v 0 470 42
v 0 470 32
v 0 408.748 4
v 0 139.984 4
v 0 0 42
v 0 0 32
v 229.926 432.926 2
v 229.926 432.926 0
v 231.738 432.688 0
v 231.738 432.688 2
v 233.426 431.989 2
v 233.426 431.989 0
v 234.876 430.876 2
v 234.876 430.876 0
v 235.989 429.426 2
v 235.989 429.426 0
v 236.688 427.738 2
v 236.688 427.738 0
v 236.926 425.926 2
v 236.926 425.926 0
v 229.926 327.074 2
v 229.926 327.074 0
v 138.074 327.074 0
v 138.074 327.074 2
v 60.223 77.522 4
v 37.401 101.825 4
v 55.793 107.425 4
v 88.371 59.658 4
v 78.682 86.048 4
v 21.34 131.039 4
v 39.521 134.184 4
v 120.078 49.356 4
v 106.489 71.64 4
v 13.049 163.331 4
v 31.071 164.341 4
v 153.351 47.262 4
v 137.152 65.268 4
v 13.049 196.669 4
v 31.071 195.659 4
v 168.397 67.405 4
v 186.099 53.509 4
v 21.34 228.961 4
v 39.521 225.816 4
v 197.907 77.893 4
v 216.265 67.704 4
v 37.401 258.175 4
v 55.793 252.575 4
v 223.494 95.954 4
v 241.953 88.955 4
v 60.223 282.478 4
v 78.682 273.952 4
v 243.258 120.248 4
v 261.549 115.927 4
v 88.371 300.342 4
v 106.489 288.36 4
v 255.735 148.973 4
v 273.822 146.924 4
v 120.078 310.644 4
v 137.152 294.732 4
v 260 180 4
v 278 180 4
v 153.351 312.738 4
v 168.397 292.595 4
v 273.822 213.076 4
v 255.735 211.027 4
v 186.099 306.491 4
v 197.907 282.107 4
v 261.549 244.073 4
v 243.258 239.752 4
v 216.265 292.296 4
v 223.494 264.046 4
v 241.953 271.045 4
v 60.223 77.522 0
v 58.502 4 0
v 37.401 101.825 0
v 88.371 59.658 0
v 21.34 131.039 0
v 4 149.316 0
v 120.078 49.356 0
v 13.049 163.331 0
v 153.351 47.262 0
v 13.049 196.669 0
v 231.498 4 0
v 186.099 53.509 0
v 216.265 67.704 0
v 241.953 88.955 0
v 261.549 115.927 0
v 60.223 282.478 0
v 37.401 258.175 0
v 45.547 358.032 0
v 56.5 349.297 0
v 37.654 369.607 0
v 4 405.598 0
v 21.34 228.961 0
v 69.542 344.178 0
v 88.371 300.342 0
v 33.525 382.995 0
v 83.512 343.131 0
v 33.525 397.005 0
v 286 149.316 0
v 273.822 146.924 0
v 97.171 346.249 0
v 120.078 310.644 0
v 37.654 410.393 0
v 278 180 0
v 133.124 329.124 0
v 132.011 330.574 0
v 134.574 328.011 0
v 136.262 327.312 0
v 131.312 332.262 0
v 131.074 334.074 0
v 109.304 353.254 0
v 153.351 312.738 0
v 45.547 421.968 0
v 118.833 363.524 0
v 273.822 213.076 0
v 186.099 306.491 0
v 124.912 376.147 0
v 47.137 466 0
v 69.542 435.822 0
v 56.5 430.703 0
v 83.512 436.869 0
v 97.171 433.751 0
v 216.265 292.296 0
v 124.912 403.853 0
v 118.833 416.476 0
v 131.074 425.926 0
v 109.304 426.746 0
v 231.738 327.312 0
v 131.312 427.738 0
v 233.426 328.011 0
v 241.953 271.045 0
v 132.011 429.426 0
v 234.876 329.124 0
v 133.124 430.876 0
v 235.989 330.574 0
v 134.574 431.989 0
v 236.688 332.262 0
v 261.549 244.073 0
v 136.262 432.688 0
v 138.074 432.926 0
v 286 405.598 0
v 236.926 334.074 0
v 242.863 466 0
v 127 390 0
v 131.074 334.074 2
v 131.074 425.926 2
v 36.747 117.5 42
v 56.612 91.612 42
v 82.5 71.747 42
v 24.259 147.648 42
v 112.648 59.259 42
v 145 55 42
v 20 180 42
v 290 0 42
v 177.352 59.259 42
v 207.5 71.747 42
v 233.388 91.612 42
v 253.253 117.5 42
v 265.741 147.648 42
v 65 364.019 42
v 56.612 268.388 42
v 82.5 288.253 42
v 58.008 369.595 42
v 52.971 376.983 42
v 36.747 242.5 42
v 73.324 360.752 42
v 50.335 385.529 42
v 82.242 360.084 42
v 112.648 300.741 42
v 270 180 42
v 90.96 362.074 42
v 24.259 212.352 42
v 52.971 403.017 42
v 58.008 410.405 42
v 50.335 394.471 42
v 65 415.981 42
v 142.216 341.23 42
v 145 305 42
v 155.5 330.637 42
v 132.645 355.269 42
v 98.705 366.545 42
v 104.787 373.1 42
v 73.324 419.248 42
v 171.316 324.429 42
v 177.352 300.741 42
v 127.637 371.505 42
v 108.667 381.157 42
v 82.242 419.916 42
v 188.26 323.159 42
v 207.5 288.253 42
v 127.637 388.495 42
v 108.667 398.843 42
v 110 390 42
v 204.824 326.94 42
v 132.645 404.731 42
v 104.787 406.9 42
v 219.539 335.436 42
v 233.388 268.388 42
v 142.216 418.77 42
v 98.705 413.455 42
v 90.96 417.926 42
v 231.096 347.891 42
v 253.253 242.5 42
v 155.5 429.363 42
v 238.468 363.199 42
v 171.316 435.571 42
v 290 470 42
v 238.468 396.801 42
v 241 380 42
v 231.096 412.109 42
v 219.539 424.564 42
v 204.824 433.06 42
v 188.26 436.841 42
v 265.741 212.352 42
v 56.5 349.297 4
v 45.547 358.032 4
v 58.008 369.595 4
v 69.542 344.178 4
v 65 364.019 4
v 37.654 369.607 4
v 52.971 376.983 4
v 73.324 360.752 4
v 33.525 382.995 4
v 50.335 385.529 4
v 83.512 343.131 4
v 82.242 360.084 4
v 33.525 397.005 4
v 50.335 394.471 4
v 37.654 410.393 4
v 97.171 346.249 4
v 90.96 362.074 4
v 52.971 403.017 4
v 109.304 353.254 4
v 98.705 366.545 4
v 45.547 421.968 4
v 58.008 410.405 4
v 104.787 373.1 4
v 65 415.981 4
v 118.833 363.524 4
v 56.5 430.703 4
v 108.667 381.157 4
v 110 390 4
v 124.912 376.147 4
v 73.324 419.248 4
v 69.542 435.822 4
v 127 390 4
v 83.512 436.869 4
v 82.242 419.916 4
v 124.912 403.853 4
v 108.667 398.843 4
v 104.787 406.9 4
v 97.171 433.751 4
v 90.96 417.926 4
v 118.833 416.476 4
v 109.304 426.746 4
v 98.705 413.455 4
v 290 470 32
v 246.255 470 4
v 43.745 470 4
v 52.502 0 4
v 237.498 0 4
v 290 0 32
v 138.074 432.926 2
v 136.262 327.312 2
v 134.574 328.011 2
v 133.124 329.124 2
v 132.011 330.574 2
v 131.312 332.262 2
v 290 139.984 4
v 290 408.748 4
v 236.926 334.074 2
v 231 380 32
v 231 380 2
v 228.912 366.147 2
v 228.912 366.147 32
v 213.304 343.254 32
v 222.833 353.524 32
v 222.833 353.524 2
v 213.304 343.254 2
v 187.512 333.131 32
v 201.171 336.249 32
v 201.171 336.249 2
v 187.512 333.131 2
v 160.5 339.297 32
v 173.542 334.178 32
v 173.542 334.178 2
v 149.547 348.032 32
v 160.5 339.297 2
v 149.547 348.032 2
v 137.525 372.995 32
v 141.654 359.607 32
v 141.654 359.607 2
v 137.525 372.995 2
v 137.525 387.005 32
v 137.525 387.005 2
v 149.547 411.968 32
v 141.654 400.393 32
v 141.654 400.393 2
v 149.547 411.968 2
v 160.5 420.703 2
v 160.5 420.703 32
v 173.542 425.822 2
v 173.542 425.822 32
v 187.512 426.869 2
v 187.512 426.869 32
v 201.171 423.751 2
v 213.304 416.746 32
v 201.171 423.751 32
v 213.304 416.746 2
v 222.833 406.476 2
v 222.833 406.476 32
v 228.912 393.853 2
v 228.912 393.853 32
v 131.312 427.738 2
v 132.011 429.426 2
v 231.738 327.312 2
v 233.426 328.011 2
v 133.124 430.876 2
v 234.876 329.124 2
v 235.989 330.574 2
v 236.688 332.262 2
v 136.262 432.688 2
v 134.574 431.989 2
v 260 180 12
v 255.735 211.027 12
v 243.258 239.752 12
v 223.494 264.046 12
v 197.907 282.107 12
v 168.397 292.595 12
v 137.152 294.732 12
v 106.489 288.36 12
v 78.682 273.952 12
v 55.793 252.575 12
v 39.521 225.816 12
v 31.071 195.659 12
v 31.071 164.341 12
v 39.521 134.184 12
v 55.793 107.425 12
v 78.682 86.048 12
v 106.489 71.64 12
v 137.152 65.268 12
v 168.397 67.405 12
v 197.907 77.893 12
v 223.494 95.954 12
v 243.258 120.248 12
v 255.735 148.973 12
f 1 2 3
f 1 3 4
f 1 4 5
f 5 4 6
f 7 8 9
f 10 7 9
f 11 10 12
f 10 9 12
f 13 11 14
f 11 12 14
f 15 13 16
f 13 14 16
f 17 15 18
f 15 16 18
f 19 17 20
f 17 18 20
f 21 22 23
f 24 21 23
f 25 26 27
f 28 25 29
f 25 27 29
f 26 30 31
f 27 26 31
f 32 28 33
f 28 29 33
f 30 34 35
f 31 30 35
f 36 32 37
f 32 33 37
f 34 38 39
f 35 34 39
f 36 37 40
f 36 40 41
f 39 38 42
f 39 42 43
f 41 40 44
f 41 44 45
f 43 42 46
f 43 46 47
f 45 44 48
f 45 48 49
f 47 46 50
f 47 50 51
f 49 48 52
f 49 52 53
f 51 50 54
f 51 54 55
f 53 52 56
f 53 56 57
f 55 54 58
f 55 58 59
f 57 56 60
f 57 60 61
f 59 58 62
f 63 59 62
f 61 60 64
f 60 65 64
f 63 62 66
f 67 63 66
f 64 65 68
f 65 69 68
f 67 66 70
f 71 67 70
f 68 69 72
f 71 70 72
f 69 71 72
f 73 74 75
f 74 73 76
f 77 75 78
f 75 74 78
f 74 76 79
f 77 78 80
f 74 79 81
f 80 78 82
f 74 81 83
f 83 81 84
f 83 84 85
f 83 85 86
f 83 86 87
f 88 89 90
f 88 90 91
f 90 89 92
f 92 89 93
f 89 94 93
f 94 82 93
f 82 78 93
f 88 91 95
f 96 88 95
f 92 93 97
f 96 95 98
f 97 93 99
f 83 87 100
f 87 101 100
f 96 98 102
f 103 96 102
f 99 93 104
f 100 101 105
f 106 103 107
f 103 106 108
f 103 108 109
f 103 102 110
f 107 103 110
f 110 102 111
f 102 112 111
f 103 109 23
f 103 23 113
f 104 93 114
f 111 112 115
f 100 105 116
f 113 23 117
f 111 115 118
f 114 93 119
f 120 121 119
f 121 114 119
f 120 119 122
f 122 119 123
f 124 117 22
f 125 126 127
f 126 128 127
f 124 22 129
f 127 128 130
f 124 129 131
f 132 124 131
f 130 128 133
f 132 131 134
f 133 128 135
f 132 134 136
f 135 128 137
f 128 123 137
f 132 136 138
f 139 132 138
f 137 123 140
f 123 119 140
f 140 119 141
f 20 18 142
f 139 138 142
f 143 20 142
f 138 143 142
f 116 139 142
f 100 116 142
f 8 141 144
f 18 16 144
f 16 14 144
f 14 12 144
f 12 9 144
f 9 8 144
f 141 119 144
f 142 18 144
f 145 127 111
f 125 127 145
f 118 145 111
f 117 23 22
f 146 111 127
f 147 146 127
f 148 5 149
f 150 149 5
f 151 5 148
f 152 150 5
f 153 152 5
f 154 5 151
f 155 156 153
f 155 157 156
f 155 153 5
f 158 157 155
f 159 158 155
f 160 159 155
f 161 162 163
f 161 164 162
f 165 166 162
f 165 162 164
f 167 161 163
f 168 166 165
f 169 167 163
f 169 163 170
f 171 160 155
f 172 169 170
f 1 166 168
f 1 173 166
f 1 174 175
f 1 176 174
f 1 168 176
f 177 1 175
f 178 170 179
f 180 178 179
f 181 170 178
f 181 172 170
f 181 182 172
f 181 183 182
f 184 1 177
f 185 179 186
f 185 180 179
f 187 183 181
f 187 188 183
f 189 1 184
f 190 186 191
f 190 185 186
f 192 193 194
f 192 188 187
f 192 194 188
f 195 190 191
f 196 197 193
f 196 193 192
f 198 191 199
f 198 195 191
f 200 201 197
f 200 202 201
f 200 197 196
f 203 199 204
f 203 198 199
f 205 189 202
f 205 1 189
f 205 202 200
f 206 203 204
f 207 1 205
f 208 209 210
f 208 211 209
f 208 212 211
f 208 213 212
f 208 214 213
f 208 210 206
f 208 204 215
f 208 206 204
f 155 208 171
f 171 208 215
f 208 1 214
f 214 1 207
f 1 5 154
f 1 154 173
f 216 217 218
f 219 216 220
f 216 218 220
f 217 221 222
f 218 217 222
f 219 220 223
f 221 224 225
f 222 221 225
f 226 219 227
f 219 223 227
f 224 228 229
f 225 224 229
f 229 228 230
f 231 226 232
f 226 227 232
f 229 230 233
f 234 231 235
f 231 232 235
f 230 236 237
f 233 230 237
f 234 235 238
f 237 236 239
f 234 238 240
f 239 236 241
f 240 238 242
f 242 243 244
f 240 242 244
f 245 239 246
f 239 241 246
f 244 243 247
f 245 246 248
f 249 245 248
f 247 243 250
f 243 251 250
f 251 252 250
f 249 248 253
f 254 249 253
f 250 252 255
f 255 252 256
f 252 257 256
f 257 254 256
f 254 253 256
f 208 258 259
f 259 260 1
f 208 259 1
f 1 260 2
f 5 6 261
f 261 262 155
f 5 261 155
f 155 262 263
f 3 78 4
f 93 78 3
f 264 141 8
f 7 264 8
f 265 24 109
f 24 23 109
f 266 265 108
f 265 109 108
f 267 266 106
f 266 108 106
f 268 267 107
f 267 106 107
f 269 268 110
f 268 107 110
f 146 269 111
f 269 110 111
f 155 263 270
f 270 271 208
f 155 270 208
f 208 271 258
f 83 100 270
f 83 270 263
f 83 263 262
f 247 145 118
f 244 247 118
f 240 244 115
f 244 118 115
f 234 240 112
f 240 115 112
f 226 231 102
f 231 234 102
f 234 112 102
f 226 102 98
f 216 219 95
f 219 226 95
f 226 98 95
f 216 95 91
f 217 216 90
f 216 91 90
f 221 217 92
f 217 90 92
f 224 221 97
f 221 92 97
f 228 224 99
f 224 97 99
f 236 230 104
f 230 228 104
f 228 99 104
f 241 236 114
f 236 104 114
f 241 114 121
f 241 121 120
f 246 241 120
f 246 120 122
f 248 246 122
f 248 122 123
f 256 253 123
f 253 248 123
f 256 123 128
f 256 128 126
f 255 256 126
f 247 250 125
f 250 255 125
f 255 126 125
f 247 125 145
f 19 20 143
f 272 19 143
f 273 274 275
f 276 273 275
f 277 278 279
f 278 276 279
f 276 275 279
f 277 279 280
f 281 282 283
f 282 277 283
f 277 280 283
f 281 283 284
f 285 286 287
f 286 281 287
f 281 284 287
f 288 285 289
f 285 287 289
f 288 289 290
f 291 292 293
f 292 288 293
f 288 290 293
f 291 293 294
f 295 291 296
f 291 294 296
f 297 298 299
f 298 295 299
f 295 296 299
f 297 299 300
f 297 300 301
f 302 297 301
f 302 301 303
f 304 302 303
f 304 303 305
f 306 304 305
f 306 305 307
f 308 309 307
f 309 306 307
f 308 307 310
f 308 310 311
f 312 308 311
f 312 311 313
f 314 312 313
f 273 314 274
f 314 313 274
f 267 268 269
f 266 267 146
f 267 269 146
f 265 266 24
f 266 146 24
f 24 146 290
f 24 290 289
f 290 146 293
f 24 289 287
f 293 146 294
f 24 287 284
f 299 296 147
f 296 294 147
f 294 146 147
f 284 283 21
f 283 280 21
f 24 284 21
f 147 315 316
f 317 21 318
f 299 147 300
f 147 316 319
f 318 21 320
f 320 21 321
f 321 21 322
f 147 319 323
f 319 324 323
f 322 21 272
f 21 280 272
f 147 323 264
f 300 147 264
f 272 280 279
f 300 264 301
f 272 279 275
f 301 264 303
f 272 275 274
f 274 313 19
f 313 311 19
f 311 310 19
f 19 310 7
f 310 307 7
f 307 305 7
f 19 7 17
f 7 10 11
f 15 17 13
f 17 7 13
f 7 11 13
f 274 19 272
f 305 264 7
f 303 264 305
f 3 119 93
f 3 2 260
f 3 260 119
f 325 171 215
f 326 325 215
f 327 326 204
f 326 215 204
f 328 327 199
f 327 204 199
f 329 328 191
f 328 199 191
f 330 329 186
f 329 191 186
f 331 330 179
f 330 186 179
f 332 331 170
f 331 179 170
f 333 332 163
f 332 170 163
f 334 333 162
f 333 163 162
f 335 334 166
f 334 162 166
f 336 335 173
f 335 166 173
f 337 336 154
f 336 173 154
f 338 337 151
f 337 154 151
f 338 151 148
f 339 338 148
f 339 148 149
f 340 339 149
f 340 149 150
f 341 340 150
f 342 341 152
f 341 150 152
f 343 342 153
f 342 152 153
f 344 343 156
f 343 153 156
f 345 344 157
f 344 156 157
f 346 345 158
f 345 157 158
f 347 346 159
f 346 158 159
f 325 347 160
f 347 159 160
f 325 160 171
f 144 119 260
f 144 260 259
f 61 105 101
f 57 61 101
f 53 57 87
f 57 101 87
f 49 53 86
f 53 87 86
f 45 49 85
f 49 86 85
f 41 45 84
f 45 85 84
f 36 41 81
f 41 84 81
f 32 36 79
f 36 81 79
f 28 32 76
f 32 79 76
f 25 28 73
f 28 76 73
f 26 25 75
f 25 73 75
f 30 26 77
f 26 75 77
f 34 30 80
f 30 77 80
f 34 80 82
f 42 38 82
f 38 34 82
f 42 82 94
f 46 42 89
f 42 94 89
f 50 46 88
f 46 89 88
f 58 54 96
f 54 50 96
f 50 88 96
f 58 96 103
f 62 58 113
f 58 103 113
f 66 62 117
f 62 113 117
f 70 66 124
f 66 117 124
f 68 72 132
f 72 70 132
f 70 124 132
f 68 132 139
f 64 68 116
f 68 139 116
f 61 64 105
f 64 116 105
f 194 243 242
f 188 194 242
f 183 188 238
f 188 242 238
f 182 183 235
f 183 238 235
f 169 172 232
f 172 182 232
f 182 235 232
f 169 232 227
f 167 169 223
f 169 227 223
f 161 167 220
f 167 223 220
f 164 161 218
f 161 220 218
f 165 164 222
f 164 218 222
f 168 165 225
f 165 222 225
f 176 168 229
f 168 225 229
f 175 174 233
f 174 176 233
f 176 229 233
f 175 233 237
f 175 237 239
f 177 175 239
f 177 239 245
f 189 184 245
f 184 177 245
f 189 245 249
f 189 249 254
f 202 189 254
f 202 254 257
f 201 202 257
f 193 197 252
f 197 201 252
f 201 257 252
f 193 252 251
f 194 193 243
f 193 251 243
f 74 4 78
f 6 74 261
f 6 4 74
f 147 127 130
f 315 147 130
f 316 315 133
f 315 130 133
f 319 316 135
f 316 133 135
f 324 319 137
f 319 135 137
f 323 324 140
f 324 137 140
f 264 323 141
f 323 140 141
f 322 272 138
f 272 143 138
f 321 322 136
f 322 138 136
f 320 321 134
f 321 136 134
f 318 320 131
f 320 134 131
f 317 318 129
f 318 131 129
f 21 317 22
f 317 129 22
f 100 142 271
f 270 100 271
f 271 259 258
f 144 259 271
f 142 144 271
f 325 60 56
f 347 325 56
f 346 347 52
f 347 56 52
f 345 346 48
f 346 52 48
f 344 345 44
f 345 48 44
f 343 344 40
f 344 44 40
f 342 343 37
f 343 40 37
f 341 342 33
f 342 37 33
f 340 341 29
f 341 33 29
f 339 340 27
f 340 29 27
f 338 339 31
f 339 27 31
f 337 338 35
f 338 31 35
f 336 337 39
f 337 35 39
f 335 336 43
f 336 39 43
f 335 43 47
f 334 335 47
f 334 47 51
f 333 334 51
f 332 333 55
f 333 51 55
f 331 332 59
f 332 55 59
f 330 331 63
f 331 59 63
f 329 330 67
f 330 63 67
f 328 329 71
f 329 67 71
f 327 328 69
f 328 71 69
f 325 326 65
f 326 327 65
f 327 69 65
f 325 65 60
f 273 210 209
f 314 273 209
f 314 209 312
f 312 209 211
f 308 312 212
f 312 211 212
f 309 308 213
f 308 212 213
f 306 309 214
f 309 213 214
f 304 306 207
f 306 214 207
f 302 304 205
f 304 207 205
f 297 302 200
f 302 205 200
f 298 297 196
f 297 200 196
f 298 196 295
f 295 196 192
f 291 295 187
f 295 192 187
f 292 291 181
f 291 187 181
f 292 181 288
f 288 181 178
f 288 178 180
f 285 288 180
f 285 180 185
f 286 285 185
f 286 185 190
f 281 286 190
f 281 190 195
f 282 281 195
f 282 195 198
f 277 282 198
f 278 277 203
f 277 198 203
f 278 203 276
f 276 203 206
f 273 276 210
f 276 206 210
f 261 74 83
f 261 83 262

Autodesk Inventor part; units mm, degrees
sketch "Эскиз1" plane through (0, 0, 0) normal (0, 0, 1) x (1, 0, 0)
  line L0 (0, 0) -> (290, 0)
  line L1 (290, 0) -> (290, 470)
  line L2 (290, 470) -> (0, 470)
  line L3 (0, 470) -> (0, 0)
  line L4 (145, 470) -> (145, 0) construction
  circle A0 centre (145, 180) radius 133
  circle A1 centre (145, 180) radius 115
  circle A2 centre (80, 390) radius 47
  circle A3 centre (80, 390) radius 30
  line L5 (138.0736, 432.9264) -> (229.9264, 432.9264)
  line L6 (236.9264, 425.9264) -> (236.9264, 334.0736)
  line L7 (229.9264, 327.0736) -> (138.0736, 327.0736)
  line L8 (131.0736, 334.0736) -> (131.0736, 425.9264)
  line L9 (131.0736, 432.9264) -> (236.9264, 327.0736) construction
  line L10 (236.9264, 432.9264) -> (131.0736, 327.0736) construction
  circle A4 centre (184, 380) radius 47
  circle A5 centre (184, 380) radius 58 construction
  line L11 (0, 160) -> (60, 0)
  line L12 (290, 160) -> (230, 0)
  line L13 (50, 470) -> (0, 400)
  line L14 (240, 470) -> (290, 400)
  line L15 (290, 320) -> (0, 320) construction
  arc A6 (236.9264, 428.9264) -> (232.9264, 432.9264) centre (232.9264, 428.9264) ccw
  arc A7 (236.9264, 425.9264) -> (229.9264, 432.9264) centre (229.9264, 425.9264) ccw
  arc A8 (138.0736, 432.9264) -> (131.0736, 425.9264) centre (138.0736, 425.9264) ccw
  arc A9 (131.0736, 334.0736) -> (138.0736, 327.0736) centre (138.0736, 334.0736) ccw
  arc A10 (229.9264, 327.0736) -> (236.9264, 334.0736) centre (229.9264, 334.0736) ccw
  line L16 (0, 320) -> (290, 320)
  dimension "d0" = 290
  dimension "d1" = 470
  dimension "d3" = 266
  dimension "d4" = 230
  dimension "d5" = 94
  dimension "d6" = 60
  dimension "d9" = 94
  dimension "d11" = 380
  dimension "d12" = 390
  dimension "d13" = 180
  dimension "d16" = 160
  dimension "d17" = 60
  dimension "d20" = 80
  dimension "d21" = 50
  dimension "d38" = 70
  dimension "d39" = 320
  dimension "d51" = 106
extrude "Выдавливание1" add sketch "Эскиз1" along normal blind 42 contours L3 L11 L0 | L11 L3 L16 L1 L12 L0 | L12 L1 L0 | L3 L13 L2 L14 L1 L16 | L3 L2 L13 | L14 L2 L1 | A0 | A2 | L5 A7 L6 A10 L7 A9 L8 A8
sketch "Эскиз3" plane through (0, 470, 0) normal (0, 1, 0) x (1, 0, 0)
  line L0 (290, 0) -> (290, -42) projected
  line L1 (0, 0) -> (0, -42) projected
  point P0 (290, -32)
  point P1 (0, -32)
  dimension "d24" = 10
  dimension "d25" = 10
sketch "Эскиз4" plane through (0, 0, 0) normal (0, -1, 0) x (1, 0, 0)
  line L0 (0, 0) -> (0, 42) projected
  line L1 (290, 0) -> (290, 42) projected
  point P0 (0, 32)
  point P1 (290, 32)
chamfer "Фаска2" distance 10 distance2 30 1 edges at (30, 180, 42) measured on face at (145, 21.6667, 42)
chamfer "Фаска3" distance 10 angle 45 1 edges at (137, 380, 42)
ref_plane "РабПлоскость8" through (0, 470, 32) normal (-0.5031, 0.3593, -0.786) x (0.8423, 0, -0.5391)
split "Разделение8" plane through (0, 470, 32) removes the side toward (-0.5031, 0.3593, -0.786)
ref_plane "РабПлоскость9" through (290, 470, 32) normal (-0.5031, -0.3593, 0.786) x (-0.8423, 0, -0.5391)
split "Разделение9" plane through (290, 470, 32) removes the side toward (0.5031, 0.3593, -0.786)
ref_plane "РабПлоскость10" through (0, 0, 32) normal (0.4634, 0.1738, 0.8689) x (0.8824, 0, -0.4706)
split "Разделение10" plane through (0, 0, 32) removes the side toward (-0.4634, -0.1738, -0.8689)
ref_plane "РабПлоскость11" through (290, 0, 32) normal (-0.4634, 0.1738, 0.8689) x (0, 0.9806, -0.1961)
split "Разделение11" plane through (290, 0, 32) removes the side toward (0.4634, -0.1738, -0.8689)
chamfer "Фаска5" distance 4 angle 45 4 edges at (290, 280, 0) (145, 470, 0) (0, 280, 0) (145, 0, 0)
extrude "Выдавливание2" cut sketch "Эскиз1" along normal blind 4 contours A0 | A1
extrude "Выдавливание3" cut sketch "Эскиз1" along normal blind 4 contours A2
extrude "Выдавливание4" cut sketch "Эскиз1" along normal blind 2 contours L5 A7 L6 A10 L7 A9 L8 A8
properties part number "Front" material "Пластик АБС"
